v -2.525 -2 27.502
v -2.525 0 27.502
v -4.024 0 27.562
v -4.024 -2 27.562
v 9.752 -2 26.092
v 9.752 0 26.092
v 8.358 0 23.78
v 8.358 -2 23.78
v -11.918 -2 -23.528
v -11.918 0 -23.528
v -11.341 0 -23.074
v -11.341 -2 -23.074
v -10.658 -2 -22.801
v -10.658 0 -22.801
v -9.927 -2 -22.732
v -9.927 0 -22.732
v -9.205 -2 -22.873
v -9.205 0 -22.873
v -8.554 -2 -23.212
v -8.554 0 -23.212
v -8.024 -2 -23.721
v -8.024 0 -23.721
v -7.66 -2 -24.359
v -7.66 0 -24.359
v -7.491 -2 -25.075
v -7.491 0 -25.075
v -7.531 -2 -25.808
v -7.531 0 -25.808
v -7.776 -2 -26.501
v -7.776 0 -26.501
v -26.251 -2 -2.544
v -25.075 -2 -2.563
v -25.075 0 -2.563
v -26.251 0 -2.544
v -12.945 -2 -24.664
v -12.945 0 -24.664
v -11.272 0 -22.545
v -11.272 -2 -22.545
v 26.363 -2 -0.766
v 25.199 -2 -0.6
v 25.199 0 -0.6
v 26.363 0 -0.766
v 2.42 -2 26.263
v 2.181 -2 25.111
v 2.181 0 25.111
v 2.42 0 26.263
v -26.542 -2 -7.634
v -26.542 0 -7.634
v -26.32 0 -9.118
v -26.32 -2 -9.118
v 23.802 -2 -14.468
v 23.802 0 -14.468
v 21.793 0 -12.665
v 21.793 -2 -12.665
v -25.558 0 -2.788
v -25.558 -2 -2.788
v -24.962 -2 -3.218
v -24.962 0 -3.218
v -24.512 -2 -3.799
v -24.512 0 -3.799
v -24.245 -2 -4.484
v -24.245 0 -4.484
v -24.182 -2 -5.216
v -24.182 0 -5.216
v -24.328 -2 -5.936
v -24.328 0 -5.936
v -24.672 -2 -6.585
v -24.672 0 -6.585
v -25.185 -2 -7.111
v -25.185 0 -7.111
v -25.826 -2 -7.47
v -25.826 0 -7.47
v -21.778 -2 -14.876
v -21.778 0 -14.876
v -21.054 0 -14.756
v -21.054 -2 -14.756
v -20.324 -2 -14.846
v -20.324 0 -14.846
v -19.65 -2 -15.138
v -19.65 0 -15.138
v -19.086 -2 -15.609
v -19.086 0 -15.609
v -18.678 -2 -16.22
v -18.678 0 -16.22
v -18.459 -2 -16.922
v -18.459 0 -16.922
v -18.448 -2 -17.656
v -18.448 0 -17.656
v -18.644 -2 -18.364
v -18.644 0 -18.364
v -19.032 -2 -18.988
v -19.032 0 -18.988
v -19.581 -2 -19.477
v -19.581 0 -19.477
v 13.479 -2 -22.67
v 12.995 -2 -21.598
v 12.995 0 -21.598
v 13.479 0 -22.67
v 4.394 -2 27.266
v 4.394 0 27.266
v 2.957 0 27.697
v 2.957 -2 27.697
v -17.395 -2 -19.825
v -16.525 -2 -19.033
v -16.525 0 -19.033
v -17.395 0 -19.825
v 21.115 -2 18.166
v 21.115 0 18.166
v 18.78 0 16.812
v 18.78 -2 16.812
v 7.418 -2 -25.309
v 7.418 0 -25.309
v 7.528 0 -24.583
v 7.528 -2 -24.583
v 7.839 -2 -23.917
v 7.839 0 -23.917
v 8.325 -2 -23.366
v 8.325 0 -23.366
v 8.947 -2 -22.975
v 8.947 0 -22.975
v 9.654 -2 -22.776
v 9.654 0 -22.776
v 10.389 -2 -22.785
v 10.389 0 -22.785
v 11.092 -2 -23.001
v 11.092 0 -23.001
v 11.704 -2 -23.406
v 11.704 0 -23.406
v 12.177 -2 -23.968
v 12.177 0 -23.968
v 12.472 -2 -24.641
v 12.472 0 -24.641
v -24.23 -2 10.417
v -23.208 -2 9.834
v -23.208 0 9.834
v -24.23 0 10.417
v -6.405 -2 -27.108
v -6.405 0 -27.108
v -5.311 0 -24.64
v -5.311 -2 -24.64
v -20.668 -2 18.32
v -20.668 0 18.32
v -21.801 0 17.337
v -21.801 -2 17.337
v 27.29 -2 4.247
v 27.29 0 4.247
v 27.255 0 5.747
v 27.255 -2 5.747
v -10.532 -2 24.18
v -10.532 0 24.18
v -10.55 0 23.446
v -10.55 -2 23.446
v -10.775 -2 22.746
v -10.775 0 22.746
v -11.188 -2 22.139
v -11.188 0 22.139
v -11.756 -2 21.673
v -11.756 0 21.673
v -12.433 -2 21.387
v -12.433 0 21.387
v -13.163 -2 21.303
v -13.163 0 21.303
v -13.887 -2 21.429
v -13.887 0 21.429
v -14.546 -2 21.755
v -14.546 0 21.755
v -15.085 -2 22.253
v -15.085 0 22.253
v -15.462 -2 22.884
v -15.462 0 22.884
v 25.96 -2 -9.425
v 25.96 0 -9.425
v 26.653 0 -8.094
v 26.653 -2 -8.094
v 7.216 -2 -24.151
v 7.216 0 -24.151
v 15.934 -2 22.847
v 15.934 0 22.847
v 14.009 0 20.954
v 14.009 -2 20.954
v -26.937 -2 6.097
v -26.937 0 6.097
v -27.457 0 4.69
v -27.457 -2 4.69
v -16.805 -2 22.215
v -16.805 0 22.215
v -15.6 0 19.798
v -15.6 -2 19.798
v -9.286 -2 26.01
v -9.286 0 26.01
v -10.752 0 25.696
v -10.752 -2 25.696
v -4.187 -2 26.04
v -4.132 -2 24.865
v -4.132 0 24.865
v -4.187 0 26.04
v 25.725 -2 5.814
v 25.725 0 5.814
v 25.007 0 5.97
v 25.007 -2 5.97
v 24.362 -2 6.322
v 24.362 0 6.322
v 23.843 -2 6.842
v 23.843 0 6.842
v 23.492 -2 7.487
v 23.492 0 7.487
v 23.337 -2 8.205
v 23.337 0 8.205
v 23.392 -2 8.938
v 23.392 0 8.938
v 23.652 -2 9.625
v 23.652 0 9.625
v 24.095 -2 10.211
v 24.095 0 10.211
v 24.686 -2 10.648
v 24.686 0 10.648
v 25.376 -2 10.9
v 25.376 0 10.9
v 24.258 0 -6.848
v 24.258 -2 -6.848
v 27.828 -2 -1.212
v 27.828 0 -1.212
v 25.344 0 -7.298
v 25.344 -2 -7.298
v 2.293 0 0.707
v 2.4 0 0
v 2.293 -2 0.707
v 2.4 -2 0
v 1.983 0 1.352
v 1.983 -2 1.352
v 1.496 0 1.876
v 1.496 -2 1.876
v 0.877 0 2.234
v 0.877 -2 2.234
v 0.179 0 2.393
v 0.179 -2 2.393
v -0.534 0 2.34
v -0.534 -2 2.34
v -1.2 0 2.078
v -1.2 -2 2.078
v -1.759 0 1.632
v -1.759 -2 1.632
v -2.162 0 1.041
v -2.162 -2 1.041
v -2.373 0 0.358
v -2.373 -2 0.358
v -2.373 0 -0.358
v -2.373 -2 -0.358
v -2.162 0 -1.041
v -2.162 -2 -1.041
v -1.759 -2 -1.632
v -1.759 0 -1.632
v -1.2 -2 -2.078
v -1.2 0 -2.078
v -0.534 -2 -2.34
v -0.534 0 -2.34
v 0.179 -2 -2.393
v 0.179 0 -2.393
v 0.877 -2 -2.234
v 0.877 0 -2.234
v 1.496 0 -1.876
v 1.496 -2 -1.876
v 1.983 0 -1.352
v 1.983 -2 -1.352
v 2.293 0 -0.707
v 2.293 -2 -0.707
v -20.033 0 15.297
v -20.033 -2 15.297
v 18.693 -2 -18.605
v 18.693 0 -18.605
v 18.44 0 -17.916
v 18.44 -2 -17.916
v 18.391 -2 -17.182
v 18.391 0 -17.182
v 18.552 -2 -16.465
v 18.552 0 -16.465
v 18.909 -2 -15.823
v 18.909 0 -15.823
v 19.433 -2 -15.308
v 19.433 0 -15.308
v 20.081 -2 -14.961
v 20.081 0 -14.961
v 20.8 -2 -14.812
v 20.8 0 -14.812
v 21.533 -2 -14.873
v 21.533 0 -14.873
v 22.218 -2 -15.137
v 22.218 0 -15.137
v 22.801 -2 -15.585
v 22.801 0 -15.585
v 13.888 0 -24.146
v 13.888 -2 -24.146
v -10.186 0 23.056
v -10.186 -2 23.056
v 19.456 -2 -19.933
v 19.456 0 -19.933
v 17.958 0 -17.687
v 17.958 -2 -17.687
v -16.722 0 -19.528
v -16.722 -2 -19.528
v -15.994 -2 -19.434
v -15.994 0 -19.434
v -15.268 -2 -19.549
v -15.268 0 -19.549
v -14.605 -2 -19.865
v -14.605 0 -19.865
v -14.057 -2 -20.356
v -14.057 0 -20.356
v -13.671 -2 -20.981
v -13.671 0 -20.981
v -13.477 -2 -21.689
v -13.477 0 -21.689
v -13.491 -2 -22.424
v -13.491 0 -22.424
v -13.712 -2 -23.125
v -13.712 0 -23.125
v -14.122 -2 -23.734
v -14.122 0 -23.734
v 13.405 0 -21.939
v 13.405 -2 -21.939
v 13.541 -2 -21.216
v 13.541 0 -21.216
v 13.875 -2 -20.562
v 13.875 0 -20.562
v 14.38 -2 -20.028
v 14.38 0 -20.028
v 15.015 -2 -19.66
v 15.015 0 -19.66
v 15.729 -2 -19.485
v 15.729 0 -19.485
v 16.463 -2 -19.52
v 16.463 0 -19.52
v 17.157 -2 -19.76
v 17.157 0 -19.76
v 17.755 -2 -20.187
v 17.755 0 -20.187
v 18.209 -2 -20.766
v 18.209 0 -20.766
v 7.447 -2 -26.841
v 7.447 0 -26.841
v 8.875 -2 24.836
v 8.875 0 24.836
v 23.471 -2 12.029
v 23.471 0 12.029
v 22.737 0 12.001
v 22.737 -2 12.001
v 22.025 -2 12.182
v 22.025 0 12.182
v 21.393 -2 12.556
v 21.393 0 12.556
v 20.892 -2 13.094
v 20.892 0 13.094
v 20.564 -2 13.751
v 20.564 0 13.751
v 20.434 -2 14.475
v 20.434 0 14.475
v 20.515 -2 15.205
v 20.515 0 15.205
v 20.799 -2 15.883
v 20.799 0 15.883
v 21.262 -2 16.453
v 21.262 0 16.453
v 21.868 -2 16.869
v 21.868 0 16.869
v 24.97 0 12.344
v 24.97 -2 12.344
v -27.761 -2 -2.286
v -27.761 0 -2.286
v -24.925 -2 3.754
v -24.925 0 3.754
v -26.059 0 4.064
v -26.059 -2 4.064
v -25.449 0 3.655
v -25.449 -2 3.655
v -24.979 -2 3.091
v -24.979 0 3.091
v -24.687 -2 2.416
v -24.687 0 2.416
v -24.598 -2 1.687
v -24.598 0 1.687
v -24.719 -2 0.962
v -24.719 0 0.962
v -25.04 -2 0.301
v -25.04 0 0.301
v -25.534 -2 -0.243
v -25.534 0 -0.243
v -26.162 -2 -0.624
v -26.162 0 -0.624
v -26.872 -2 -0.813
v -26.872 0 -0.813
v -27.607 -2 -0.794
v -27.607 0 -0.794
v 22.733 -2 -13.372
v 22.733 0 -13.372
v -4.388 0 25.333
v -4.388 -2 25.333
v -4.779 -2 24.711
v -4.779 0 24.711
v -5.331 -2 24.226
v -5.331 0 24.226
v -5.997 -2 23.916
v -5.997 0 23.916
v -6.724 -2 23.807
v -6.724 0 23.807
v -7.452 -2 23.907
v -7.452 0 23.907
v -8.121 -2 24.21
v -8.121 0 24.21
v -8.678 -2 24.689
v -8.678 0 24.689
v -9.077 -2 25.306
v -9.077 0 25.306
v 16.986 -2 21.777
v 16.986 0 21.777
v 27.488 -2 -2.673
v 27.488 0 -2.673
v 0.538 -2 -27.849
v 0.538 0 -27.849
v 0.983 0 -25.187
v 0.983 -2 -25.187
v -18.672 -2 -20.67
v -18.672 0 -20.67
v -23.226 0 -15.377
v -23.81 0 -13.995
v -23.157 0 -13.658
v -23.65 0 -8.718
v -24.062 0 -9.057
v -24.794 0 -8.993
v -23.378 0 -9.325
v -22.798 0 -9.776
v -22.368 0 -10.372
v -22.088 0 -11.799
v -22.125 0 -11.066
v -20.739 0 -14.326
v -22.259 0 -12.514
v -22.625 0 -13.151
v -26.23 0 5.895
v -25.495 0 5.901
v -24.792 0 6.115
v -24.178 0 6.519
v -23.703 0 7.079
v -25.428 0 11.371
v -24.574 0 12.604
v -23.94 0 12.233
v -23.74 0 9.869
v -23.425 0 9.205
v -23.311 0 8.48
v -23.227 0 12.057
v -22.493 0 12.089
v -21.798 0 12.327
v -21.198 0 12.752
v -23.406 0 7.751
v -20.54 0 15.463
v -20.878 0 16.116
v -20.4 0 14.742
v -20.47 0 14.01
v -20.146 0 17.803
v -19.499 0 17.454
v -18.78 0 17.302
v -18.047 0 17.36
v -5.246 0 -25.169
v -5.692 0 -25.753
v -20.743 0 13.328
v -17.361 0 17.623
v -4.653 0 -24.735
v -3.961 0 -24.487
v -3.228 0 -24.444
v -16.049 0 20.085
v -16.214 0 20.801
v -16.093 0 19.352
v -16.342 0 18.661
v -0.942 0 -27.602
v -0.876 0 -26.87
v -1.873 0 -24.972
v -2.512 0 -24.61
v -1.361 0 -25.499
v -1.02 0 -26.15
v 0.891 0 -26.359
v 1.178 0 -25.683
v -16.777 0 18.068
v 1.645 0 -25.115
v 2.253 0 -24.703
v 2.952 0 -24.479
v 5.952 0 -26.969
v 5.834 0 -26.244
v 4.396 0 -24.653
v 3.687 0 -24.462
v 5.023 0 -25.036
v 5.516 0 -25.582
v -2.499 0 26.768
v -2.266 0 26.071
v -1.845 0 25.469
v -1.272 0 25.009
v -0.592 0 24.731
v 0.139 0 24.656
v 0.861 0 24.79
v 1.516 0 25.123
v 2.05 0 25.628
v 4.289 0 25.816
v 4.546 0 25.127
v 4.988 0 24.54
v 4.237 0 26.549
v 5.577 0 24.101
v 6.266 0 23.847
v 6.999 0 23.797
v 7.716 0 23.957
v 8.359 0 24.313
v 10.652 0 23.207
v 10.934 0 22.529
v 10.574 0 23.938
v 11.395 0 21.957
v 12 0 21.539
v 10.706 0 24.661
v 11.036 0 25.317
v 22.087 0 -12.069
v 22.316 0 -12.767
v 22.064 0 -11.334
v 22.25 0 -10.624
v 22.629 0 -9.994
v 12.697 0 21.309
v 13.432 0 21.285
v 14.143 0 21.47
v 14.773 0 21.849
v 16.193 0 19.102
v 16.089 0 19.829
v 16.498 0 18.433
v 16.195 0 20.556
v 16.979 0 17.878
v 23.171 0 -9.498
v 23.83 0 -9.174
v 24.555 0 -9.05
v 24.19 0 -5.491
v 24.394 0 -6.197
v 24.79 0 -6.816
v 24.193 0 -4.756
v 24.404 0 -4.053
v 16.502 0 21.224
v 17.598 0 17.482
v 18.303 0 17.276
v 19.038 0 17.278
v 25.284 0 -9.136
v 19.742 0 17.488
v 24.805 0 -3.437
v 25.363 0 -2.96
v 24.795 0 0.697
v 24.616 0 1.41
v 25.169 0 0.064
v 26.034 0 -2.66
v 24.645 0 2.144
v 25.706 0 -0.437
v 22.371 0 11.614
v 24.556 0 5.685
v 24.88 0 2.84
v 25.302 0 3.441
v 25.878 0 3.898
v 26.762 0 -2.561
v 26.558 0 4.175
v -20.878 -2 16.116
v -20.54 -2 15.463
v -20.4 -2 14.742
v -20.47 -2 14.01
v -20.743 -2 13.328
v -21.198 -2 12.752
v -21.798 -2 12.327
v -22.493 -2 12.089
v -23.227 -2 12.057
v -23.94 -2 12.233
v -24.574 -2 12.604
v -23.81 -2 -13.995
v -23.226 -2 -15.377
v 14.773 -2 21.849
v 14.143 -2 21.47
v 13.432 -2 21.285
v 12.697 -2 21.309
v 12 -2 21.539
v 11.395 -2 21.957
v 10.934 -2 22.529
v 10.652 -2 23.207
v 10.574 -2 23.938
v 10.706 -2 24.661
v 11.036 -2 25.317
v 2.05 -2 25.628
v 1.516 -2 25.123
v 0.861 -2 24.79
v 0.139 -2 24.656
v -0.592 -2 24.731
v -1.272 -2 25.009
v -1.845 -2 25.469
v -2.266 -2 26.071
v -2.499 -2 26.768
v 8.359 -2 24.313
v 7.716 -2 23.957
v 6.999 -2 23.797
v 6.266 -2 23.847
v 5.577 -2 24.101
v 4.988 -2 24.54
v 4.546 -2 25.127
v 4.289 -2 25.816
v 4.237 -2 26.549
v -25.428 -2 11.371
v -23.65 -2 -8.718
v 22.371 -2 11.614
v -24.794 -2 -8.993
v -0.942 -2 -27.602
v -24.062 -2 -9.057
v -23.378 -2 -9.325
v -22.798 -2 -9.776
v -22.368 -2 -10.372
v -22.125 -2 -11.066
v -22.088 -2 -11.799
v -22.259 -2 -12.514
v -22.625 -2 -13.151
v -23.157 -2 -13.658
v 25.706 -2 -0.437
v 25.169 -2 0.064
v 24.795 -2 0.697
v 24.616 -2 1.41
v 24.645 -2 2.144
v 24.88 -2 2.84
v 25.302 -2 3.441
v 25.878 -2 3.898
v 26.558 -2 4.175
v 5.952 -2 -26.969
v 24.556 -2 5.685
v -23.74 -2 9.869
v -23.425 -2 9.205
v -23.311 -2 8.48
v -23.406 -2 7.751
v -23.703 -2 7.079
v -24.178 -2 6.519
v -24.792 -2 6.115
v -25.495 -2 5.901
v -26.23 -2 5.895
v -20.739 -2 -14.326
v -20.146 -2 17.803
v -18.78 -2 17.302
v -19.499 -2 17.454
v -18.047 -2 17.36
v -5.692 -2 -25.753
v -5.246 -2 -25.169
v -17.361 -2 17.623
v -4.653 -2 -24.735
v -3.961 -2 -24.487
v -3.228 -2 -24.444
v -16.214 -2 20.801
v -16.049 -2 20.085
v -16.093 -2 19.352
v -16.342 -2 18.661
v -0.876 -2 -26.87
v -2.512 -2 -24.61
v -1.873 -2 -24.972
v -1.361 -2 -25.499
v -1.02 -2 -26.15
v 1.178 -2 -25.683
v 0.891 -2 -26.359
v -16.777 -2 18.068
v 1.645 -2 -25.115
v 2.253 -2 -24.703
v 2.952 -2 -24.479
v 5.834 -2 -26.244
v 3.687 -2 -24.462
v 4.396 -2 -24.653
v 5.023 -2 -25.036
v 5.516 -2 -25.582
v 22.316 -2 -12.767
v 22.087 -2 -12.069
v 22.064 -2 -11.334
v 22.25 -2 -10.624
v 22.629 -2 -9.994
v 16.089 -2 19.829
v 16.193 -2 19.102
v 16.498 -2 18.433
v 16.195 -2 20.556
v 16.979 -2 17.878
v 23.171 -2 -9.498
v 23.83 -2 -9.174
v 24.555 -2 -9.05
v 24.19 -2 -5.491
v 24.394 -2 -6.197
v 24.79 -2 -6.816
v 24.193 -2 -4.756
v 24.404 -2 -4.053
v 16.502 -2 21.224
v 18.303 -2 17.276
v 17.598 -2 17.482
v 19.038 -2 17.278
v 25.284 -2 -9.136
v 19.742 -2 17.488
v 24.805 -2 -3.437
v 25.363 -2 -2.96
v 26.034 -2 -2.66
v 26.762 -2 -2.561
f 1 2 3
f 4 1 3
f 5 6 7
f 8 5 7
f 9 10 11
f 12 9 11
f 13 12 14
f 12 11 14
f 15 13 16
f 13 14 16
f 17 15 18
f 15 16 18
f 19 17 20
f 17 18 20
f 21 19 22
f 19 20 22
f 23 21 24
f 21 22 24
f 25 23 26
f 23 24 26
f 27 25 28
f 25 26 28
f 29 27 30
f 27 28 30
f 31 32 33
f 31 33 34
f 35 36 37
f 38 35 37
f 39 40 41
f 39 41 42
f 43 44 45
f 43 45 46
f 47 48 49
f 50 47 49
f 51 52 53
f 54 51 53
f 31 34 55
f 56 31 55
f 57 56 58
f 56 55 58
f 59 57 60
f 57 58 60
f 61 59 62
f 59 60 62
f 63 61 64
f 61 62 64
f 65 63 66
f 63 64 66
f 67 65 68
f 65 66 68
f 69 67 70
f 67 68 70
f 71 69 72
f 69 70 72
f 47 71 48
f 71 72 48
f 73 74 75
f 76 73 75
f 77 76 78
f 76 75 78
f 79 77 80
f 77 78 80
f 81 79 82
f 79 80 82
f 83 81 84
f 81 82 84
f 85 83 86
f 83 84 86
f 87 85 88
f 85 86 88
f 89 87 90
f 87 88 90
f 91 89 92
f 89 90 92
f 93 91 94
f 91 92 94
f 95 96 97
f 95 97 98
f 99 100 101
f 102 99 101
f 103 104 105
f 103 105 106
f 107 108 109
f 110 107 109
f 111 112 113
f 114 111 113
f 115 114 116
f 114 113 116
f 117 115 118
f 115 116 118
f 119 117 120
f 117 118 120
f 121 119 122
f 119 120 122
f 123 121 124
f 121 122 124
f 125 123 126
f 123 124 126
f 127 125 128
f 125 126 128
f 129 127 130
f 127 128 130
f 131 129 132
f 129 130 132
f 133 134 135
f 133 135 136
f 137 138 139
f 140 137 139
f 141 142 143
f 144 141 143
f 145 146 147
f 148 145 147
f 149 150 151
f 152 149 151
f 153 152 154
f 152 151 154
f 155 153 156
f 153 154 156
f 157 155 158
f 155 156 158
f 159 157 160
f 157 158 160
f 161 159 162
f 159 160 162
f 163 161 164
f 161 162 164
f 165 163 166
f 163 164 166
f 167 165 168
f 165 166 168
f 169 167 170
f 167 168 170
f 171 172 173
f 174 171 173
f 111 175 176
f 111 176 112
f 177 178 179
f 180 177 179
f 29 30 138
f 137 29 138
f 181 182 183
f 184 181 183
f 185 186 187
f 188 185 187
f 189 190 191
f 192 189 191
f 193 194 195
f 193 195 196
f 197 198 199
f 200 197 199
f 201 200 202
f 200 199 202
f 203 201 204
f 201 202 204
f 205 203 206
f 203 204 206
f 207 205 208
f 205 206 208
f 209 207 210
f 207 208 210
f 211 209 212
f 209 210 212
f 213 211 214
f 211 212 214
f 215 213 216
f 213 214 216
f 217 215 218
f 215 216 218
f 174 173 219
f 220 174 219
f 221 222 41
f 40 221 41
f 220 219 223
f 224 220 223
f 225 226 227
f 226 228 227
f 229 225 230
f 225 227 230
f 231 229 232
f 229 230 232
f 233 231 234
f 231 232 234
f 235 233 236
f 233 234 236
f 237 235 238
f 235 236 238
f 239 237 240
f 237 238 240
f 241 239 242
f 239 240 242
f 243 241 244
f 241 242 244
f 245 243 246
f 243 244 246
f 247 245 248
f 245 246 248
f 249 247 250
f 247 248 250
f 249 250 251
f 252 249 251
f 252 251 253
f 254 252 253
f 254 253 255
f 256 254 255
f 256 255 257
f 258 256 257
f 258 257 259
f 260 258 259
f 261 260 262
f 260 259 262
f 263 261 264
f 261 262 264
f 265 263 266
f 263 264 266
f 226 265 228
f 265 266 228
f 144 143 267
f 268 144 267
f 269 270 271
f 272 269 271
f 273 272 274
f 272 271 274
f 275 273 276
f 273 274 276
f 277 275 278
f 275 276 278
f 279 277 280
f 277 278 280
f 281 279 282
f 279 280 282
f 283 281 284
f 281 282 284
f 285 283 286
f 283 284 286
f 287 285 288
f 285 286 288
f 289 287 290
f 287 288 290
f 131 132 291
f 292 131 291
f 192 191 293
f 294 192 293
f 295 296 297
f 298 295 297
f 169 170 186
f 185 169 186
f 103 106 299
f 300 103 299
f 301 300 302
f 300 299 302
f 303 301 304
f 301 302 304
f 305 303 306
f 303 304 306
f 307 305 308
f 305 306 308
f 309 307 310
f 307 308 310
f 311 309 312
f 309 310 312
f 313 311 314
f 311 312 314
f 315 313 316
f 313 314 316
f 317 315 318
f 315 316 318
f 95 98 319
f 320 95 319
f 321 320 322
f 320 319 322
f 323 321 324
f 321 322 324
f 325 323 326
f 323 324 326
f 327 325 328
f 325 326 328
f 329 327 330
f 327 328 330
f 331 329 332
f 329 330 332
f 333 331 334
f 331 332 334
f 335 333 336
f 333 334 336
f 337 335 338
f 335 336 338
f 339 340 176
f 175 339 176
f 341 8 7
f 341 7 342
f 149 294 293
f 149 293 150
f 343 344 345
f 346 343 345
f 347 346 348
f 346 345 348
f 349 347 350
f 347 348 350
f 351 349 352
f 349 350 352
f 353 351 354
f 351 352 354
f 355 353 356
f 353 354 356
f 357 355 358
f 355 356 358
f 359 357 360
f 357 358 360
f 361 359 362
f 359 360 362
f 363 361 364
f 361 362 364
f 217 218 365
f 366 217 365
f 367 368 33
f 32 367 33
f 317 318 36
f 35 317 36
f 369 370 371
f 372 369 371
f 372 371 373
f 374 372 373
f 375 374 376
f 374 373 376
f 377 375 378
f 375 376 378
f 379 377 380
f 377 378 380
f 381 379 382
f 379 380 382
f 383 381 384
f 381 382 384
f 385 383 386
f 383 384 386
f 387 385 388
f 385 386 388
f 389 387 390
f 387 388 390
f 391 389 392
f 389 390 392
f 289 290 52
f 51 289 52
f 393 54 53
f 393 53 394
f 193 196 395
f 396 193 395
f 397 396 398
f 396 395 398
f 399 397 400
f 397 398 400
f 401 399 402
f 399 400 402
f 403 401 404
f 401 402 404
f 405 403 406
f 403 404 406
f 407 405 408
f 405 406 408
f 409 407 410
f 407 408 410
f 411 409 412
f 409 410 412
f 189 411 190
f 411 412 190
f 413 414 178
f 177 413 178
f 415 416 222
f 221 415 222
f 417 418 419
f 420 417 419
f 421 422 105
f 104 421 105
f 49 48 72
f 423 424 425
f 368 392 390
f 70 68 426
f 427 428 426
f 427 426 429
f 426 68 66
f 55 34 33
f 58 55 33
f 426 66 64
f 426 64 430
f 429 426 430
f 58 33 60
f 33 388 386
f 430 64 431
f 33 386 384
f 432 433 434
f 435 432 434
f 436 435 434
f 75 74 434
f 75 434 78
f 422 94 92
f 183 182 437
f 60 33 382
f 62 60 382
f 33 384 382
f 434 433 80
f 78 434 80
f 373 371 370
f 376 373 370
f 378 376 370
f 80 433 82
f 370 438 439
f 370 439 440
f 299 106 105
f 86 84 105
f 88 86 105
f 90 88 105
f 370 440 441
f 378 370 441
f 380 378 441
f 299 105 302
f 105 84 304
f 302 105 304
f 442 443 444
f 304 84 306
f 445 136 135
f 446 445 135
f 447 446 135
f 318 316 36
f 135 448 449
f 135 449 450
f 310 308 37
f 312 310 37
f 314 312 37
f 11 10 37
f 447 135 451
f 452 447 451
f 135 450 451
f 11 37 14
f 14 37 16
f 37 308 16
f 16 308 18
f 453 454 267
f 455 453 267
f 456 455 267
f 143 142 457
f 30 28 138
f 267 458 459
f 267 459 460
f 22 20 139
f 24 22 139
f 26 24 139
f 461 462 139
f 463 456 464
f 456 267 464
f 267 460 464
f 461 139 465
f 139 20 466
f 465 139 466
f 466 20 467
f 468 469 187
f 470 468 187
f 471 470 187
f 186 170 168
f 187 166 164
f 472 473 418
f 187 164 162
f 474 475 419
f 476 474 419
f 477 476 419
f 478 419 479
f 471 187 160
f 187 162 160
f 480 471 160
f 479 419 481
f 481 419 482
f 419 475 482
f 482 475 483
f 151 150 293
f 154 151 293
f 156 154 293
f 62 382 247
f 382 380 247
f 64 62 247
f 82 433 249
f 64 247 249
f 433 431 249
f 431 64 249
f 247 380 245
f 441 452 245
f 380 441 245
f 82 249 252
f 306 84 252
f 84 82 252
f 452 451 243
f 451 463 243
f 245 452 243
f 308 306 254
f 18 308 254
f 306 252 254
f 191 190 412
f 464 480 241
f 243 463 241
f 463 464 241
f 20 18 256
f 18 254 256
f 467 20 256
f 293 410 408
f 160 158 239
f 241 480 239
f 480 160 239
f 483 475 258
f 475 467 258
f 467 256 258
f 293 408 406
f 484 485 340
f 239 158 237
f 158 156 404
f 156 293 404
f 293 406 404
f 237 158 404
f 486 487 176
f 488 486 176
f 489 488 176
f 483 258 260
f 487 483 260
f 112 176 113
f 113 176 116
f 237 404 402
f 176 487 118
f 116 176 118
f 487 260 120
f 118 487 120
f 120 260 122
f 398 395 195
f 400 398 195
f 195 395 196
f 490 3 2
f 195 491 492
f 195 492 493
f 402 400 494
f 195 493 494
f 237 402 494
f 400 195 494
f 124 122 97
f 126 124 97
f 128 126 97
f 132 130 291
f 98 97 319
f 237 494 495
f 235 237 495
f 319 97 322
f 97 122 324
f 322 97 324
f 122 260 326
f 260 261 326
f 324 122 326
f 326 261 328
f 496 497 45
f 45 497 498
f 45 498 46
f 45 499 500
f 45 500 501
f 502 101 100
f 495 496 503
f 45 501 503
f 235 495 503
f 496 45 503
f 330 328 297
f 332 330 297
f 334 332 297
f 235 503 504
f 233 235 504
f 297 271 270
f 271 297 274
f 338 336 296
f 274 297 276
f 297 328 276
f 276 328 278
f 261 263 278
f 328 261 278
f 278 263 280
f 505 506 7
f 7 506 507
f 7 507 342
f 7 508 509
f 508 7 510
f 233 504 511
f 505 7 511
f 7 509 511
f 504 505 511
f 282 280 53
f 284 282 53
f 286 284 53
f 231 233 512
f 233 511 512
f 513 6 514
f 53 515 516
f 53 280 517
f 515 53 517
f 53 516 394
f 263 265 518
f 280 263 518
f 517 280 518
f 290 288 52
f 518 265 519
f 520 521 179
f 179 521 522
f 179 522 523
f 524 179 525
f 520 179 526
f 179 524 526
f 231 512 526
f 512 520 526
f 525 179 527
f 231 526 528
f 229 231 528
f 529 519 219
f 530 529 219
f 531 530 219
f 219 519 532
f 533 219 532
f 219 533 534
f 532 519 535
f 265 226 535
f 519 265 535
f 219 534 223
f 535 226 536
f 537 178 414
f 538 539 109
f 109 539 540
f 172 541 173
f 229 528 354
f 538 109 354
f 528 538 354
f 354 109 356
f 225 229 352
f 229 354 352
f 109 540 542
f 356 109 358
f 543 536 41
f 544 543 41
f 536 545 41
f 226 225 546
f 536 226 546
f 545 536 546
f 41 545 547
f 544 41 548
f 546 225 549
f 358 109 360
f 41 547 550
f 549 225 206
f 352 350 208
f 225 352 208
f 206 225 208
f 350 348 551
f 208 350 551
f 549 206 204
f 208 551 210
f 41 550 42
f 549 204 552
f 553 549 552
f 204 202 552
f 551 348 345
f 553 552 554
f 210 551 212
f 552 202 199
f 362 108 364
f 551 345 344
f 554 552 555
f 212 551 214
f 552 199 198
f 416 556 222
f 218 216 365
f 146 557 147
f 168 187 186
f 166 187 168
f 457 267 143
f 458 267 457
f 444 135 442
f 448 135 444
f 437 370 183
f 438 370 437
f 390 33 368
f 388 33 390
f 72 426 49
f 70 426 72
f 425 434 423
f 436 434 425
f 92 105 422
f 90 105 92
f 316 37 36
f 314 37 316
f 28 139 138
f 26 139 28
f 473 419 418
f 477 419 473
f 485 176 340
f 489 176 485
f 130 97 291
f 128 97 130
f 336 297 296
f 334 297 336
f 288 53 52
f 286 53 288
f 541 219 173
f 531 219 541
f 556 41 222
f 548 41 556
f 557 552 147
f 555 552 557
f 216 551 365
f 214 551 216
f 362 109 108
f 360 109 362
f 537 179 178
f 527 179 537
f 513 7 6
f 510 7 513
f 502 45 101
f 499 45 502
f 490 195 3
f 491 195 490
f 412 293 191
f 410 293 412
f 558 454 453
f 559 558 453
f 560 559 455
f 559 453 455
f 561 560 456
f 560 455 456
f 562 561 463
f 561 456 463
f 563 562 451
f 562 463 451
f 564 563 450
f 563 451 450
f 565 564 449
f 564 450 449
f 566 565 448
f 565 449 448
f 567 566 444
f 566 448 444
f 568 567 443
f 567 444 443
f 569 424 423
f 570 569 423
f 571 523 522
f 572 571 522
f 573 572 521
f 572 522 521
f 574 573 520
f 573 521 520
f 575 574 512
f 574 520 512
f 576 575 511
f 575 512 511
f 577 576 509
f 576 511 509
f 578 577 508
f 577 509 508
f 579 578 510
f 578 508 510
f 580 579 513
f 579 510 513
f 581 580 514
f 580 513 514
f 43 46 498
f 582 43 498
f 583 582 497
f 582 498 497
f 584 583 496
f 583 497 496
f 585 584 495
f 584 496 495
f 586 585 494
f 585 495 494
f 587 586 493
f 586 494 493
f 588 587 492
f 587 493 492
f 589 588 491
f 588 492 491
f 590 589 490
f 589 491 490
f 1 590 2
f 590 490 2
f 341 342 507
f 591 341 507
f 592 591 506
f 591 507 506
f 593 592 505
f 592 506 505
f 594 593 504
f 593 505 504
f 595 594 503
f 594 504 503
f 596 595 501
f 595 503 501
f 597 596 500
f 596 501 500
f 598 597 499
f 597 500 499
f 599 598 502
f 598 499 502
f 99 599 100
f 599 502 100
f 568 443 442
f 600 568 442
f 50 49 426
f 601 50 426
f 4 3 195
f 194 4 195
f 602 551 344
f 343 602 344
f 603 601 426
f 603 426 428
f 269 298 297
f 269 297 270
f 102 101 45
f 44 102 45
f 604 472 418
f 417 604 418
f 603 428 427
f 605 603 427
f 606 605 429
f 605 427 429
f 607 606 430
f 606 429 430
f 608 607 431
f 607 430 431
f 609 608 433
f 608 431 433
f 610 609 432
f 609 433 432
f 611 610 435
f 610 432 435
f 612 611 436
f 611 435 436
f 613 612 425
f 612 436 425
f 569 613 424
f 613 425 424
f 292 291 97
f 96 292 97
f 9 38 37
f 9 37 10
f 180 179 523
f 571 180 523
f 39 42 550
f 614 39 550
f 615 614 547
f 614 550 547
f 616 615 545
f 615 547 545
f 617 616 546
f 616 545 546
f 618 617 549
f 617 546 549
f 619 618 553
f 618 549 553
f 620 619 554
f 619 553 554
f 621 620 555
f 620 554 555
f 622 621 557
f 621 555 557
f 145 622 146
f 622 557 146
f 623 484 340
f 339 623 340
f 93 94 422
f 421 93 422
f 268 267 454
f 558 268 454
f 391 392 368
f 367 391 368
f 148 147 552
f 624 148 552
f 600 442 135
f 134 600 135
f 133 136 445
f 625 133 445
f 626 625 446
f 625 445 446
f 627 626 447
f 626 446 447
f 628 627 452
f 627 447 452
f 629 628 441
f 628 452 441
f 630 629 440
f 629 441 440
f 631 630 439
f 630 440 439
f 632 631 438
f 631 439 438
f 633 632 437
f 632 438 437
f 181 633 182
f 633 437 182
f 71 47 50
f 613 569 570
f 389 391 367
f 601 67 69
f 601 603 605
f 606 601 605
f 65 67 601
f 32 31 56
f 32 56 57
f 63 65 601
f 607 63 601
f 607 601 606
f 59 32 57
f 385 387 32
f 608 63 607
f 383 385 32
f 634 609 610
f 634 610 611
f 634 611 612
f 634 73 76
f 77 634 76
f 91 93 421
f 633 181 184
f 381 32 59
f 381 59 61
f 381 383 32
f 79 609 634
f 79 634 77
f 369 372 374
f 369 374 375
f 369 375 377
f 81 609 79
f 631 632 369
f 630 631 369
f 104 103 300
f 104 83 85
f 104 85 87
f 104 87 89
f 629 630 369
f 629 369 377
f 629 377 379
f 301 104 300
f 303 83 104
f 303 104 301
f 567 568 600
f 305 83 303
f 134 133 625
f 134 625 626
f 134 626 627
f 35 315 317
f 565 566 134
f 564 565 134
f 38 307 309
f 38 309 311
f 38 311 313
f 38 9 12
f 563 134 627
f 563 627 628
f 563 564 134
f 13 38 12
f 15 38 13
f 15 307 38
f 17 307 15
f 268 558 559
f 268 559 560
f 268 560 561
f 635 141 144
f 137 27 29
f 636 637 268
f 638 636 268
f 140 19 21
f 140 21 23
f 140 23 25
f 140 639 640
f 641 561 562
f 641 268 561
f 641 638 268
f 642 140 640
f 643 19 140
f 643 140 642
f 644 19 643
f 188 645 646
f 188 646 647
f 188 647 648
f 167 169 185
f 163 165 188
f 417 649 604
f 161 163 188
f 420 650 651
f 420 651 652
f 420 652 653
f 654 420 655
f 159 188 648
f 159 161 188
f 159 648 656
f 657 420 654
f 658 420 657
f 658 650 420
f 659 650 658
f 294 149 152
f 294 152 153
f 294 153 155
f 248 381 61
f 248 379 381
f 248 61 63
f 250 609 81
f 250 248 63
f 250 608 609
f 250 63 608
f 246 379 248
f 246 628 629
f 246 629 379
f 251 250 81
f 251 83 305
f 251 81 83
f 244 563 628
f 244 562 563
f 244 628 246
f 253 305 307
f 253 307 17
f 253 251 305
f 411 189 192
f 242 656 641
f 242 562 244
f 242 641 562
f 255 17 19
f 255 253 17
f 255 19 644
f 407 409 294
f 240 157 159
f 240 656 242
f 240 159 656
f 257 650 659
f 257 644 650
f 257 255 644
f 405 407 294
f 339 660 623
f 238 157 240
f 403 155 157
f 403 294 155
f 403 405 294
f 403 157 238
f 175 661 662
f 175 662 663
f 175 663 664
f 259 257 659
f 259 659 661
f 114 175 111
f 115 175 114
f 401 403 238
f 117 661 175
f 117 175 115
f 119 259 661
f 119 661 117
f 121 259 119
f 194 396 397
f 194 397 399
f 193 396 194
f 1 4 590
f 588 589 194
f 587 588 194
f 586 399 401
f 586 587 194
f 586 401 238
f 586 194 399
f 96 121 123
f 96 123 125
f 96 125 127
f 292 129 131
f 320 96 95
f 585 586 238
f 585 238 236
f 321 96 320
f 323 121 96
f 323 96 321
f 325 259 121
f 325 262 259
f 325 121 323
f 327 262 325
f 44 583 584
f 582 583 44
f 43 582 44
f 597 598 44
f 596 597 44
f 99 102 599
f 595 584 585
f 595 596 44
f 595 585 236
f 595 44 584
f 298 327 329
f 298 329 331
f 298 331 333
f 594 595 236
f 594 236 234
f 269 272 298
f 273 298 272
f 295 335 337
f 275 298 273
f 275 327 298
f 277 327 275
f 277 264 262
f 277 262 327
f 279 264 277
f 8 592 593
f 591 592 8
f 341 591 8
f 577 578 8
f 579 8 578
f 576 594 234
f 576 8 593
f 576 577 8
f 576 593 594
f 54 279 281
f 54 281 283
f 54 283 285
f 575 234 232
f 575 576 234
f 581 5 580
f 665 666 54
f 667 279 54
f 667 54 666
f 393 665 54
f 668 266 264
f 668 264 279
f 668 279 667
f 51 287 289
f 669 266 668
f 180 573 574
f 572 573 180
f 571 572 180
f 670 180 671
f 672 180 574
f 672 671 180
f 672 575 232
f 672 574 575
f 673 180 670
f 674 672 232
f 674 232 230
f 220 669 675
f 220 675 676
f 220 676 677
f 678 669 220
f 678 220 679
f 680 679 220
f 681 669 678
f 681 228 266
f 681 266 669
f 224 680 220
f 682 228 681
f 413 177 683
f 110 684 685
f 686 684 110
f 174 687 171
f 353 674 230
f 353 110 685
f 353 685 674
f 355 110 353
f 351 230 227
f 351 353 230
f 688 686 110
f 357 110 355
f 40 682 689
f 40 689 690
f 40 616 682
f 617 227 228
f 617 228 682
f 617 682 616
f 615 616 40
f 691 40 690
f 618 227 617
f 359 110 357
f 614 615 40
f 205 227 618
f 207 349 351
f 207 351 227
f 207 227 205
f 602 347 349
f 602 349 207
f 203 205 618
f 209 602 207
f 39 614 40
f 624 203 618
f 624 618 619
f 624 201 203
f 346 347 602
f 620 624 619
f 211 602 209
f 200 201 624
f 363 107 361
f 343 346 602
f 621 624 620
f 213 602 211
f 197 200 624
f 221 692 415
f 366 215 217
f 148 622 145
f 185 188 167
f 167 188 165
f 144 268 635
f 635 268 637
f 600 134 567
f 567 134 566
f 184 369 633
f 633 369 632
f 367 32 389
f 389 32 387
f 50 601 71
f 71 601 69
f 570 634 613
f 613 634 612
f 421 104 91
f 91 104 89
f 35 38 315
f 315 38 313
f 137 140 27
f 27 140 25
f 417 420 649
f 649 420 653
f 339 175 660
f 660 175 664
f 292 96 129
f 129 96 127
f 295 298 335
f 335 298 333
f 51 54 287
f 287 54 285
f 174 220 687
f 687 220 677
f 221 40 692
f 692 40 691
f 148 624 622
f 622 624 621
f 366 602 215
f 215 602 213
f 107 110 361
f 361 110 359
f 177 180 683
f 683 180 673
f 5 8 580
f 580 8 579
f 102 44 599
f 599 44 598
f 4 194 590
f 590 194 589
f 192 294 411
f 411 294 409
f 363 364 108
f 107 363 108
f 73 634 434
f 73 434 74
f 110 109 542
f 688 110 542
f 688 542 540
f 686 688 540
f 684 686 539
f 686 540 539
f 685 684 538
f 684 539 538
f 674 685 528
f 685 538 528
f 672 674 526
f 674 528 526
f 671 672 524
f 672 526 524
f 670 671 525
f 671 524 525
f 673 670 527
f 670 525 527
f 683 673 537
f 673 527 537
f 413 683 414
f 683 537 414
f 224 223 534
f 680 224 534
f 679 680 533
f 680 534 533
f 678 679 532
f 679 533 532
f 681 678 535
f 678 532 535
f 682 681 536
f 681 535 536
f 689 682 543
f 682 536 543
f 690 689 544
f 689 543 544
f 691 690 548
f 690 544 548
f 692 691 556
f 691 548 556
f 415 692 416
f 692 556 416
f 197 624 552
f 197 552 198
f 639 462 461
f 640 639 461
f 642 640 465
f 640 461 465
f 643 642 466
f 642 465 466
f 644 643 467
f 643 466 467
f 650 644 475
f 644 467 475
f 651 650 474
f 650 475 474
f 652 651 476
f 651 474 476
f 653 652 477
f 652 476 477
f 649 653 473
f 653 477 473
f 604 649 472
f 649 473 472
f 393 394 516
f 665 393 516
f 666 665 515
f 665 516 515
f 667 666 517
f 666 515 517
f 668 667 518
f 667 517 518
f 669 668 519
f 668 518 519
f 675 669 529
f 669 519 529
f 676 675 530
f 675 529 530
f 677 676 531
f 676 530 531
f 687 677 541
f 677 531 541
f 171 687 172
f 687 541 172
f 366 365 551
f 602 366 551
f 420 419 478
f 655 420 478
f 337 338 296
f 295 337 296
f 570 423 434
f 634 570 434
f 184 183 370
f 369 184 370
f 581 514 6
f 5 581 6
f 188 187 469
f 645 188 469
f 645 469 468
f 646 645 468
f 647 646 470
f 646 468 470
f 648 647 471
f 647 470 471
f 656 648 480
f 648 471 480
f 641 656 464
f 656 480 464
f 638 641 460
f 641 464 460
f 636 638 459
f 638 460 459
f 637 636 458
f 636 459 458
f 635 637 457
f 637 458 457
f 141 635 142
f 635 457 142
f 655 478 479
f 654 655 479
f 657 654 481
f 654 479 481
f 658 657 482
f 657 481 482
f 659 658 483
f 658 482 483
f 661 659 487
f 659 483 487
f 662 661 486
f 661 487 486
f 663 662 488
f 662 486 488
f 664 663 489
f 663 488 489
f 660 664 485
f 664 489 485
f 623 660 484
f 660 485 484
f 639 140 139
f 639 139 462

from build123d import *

# Parameters (mm, degrees)
F1_DEPTH = 2
F2_COUNT = 25
F3_DEPTH = 2
F0_R     = 1.3791907975
F4_R     = 24.1789897238
F5_DEPTH = 2
F6_R     = 2.4
F7_DEPTH = 12.5


with BuildPart() as f1:
    # F0 (on Front) → F1 (new body)
    with BuildSketch(Plane.XZ):
        with BuildLine():
            ThreePointArc((-20.8778160203, 16.1155972919), (-21.1981117968, 12.751512491), (-24.5742007448, 12.6042734059))
            Line((-24.5742007448, 12.6042734059), (-25.4280168593, 11.3709859121))
            Line((-25.4280168593, 11.3709859121), (-22.1392502091, 9.0941429398))
            Line((-22.1392502091, 9.0941429398), (-18.7239857507, 14.0272929152))
            Line((-18.7239857507, 14.0272929152), (-20.8778160203, 16.1155972919))
        make_face()
    extrude(amount=F1_DEPTH)


with BuildPart() as f2_1:
    # F2: instance of F1
    add(f1.part.rotate(Axis((0, 0, 0), (0, -1, 0)), 1 * 360 / F2_COUNT))


with BuildPart() as f2_2:
    # F2: instance of F1
    add(f1.part.rotate(Axis((0, 0, 0), (0, -1, 0)), 2 * 360 / F2_COUNT))


with BuildPart() as f2_3:
    # F2: instance of F1
    add(f1.part.rotate(Axis((0, 0, 0), (0, -1, 0)), 3 * 360 / F2_COUNT))


with BuildPart() as f2_4:
    # F2: instance of F1
    add(f1.part.rotate(Axis((0, 0, 0), (0, -1, 0)), 4 * 360 / F2_COUNT))


with BuildPart() as f2_5:
    # F2: instance of F1
    add(f1.part.rotate(Axis((0, 0, 0), (0, -1, 0)), 5 * 360 / F2_COUNT))


with BuildPart() as f2_6:
    # F2: instance of F1
    add(f1.part.rotate(Axis((0, 0, 0), (0, -1, 0)), 6 * 360 / F2_COUNT))


with BuildPart() as f2_7:
    # F2: instance of F1
    add(f1.part.rotate(Axis((0, 0, 0), (0, -1, 0)), 7 * 360 / F2_COUNT))


with BuildPart() as f2_8:
    # F2: instance of F1
    add(f1.part.rotate(Axis((0, 0, 0), (0, -1, 0)), 8 * 360 / F2_COUNT))


with BuildPart() as f2_9:
    # F2: instance of F1
    add(f1.part.rotate(Axis((0, 0, 0), (0, -1, 0)), 9 * 360 / F2_COUNT))


with BuildPart() as f2_10:
    # F2: instance of F1
    add(f1.part.rotate(Axis((0, 0, 0), (0, -1, 0)), 10 * 360 / F2_COUNT))


with BuildPart() as f2_11:
    # F2: instance of F1
    add(f1.part.rotate(Axis((0, 0, 0), (0, -1, 0)), 11 * 360 / F2_COUNT))


with BuildPart() as f2_12:
    # F2: instance of F1
    add(f1.part.rotate(Axis((0, 0, 0), (0, -1, 0)), 12 * 360 / F2_COUNT))


with BuildPart() as f2_13:
    # F2: instance of F1
    add(f1.part.rotate(Axis((0, 0, 0), (0, -1, 0)), 13 * 360 / F2_COUNT))


with BuildPart() as f2_14:
    # F2: instance of F1
    add(f1.part.rotate(Axis((0, 0, 0), (0, -1, 0)), 14 * 360 / F2_COUNT))


with BuildPart() as f2_15:
    # F2: instance of F1
    add(f1.part.rotate(Axis((0, 0, 0), (0, -1, 0)), 15 * 360 / F2_COUNT))


with BuildPart() as f2_16:
    # F2: instance of F1
    add(f1.part.rotate(Axis((0, 0, 0), (0, -1, 0)), 16 * 360 / F2_COUNT))


with BuildPart() as f2_17:
    # F2: instance of F1
    add(f1.part.rotate(Axis((0, 0, 0), (0, -1, 0)), 17 * 360 / F2_COUNT))


with BuildPart() as f2_18:
    # F2: instance of F1
    add(f1.part.rotate(Axis((0, 0, 0), (0, -1, 0)), 18 * 360 / F2_COUNT))


with BuildPart() as f2_19:
    # F2: instance of F1
    add(f1.part.rotate(Axis((0, 0, 0), (0, -1, 0)), 19 * 360 / F2_COUNT))


with BuildPart() as f2_20:
    # F2: instance of F1
    add(f1.part.rotate(Axis((0, 0, 0), (0, -1, 0)), 20 * 360 / F2_COUNT))


with BuildPart() as f2_21:
    # F2: instance of F1
    add(f1.part.rotate(Axis((0, 0, 0), (0, -1, 0)), 21 * 360 / F2_COUNT))


with BuildPart() as f2_22:
    # F2: instance of F1
    add(f1.part.rotate(Axis((0, 0, 0), (0, -1, 0)), 22 * 360 / F2_COUNT))


with BuildPart() as f2_23:
    # F2: instance of F1
    add(f1.part.rotate(Axis((0, 0, 0), (0, -1, 0)), 23 * 360 / F2_COUNT))


with BuildPart() as f2_24:
    # F2: instance of F1
    add(f1.part.rotate(Axis((0, 0, 0), (0, -1, 0)), 24 * 360 / F2_COUNT))


with BuildPart() as f1_1:
    add(f1.part)

    add(f2_1.part)  # F3 merges F2_1

    add(f2_24.part)  # F3 merges F2_24
    # F0 (on Front) → F3 (join)
    with BuildSketch(Plane.XZ):
        with BuildLine():
            ThreePointArc((-20.8778160203, 16.1155972919), (-21.1981117968, 12.751512491), (-24.5742007448, 12.6042734059))
            Line((-24.5742007448, 12.6042734059), (-25.4280168593, 11.3709859121))
            Line((-25.4280168593, 11.3709859121), (-22.1392502091, 9.0941429398))
            Line((-22.1392502091, 9.0941429398), (-18.7239857507, 14.0272929152))
            Line((-18.7239857507, 14.0272929152), (-20.8778160203, 16.1155972919))
        make_face()
    extrude(amount=F3_DEPTH)

    add(f2_2.part)  # F5 merges F2_2

    add(f2_3.part)  # F5 merges F2_3

    add(f2_4.part)  # F5 merges F2_4

    add(f2_5.part)  # F5 merges F2_5

    add(f2_6.part)  # F5 merges F2_6

    add(f2_7.part)  # F5 merges F2_7

    add(f2_8.part)  # F5 merges F2_8

    add(f2_9.part)  # F5 merges F2_9

    add(f2_10.part)  # F5 merges F2_10

    add(f2_11.part)  # F5 merges F2_11

    add(f2_12.part)  # F5 merges F2_12

    add(f2_13.part)  # F5 merges F2_13

    add(f2_14.part)  # F5 merges F2_14

    add(f2_15.part)  # F5 merges F2_15

    add(f2_16.part)  # F5 merges F2_16

    add(f2_17.part)  # F5 merges F2_17

    add(f2_18.part)  # F5 merges F2_18

    add(f2_19.part)  # F5 merges F2_19

    add(f2_20.part)  # F5 merges F2_20

    add(f2_21.part)  # F5 merges F2_21

    add(f2_22.part)  # F5 merges F2_22

    add(f2_23.part)  # F5 merges F2_23


with BuildPart() as f3:
    # F0 (on Front) → F3, piece 2 (new body)
    with BuildSketch(Plane.XZ):
        Circle(F0_R)
    extrude(amount=F3_DEPTH)


with BuildPart() as f1_2:
    add(f1_1.part)

    add(f3.part)  # F5 merges F3
    # F4 (on Front) → F5 (join)
    with BuildSketch(Plane.XZ):
        Circle(F4_R)
    extrude(amount=F5_DEPTH)

    # F6 (on Front) → F7 (cut, symmetric)
    with BuildSketch(Plane.XZ):
        Circle(F6_R)
    extrude(amount=F7_DEPTH, both=True, mode=Mode.SUBTRACT)


solid = f1_2.part
